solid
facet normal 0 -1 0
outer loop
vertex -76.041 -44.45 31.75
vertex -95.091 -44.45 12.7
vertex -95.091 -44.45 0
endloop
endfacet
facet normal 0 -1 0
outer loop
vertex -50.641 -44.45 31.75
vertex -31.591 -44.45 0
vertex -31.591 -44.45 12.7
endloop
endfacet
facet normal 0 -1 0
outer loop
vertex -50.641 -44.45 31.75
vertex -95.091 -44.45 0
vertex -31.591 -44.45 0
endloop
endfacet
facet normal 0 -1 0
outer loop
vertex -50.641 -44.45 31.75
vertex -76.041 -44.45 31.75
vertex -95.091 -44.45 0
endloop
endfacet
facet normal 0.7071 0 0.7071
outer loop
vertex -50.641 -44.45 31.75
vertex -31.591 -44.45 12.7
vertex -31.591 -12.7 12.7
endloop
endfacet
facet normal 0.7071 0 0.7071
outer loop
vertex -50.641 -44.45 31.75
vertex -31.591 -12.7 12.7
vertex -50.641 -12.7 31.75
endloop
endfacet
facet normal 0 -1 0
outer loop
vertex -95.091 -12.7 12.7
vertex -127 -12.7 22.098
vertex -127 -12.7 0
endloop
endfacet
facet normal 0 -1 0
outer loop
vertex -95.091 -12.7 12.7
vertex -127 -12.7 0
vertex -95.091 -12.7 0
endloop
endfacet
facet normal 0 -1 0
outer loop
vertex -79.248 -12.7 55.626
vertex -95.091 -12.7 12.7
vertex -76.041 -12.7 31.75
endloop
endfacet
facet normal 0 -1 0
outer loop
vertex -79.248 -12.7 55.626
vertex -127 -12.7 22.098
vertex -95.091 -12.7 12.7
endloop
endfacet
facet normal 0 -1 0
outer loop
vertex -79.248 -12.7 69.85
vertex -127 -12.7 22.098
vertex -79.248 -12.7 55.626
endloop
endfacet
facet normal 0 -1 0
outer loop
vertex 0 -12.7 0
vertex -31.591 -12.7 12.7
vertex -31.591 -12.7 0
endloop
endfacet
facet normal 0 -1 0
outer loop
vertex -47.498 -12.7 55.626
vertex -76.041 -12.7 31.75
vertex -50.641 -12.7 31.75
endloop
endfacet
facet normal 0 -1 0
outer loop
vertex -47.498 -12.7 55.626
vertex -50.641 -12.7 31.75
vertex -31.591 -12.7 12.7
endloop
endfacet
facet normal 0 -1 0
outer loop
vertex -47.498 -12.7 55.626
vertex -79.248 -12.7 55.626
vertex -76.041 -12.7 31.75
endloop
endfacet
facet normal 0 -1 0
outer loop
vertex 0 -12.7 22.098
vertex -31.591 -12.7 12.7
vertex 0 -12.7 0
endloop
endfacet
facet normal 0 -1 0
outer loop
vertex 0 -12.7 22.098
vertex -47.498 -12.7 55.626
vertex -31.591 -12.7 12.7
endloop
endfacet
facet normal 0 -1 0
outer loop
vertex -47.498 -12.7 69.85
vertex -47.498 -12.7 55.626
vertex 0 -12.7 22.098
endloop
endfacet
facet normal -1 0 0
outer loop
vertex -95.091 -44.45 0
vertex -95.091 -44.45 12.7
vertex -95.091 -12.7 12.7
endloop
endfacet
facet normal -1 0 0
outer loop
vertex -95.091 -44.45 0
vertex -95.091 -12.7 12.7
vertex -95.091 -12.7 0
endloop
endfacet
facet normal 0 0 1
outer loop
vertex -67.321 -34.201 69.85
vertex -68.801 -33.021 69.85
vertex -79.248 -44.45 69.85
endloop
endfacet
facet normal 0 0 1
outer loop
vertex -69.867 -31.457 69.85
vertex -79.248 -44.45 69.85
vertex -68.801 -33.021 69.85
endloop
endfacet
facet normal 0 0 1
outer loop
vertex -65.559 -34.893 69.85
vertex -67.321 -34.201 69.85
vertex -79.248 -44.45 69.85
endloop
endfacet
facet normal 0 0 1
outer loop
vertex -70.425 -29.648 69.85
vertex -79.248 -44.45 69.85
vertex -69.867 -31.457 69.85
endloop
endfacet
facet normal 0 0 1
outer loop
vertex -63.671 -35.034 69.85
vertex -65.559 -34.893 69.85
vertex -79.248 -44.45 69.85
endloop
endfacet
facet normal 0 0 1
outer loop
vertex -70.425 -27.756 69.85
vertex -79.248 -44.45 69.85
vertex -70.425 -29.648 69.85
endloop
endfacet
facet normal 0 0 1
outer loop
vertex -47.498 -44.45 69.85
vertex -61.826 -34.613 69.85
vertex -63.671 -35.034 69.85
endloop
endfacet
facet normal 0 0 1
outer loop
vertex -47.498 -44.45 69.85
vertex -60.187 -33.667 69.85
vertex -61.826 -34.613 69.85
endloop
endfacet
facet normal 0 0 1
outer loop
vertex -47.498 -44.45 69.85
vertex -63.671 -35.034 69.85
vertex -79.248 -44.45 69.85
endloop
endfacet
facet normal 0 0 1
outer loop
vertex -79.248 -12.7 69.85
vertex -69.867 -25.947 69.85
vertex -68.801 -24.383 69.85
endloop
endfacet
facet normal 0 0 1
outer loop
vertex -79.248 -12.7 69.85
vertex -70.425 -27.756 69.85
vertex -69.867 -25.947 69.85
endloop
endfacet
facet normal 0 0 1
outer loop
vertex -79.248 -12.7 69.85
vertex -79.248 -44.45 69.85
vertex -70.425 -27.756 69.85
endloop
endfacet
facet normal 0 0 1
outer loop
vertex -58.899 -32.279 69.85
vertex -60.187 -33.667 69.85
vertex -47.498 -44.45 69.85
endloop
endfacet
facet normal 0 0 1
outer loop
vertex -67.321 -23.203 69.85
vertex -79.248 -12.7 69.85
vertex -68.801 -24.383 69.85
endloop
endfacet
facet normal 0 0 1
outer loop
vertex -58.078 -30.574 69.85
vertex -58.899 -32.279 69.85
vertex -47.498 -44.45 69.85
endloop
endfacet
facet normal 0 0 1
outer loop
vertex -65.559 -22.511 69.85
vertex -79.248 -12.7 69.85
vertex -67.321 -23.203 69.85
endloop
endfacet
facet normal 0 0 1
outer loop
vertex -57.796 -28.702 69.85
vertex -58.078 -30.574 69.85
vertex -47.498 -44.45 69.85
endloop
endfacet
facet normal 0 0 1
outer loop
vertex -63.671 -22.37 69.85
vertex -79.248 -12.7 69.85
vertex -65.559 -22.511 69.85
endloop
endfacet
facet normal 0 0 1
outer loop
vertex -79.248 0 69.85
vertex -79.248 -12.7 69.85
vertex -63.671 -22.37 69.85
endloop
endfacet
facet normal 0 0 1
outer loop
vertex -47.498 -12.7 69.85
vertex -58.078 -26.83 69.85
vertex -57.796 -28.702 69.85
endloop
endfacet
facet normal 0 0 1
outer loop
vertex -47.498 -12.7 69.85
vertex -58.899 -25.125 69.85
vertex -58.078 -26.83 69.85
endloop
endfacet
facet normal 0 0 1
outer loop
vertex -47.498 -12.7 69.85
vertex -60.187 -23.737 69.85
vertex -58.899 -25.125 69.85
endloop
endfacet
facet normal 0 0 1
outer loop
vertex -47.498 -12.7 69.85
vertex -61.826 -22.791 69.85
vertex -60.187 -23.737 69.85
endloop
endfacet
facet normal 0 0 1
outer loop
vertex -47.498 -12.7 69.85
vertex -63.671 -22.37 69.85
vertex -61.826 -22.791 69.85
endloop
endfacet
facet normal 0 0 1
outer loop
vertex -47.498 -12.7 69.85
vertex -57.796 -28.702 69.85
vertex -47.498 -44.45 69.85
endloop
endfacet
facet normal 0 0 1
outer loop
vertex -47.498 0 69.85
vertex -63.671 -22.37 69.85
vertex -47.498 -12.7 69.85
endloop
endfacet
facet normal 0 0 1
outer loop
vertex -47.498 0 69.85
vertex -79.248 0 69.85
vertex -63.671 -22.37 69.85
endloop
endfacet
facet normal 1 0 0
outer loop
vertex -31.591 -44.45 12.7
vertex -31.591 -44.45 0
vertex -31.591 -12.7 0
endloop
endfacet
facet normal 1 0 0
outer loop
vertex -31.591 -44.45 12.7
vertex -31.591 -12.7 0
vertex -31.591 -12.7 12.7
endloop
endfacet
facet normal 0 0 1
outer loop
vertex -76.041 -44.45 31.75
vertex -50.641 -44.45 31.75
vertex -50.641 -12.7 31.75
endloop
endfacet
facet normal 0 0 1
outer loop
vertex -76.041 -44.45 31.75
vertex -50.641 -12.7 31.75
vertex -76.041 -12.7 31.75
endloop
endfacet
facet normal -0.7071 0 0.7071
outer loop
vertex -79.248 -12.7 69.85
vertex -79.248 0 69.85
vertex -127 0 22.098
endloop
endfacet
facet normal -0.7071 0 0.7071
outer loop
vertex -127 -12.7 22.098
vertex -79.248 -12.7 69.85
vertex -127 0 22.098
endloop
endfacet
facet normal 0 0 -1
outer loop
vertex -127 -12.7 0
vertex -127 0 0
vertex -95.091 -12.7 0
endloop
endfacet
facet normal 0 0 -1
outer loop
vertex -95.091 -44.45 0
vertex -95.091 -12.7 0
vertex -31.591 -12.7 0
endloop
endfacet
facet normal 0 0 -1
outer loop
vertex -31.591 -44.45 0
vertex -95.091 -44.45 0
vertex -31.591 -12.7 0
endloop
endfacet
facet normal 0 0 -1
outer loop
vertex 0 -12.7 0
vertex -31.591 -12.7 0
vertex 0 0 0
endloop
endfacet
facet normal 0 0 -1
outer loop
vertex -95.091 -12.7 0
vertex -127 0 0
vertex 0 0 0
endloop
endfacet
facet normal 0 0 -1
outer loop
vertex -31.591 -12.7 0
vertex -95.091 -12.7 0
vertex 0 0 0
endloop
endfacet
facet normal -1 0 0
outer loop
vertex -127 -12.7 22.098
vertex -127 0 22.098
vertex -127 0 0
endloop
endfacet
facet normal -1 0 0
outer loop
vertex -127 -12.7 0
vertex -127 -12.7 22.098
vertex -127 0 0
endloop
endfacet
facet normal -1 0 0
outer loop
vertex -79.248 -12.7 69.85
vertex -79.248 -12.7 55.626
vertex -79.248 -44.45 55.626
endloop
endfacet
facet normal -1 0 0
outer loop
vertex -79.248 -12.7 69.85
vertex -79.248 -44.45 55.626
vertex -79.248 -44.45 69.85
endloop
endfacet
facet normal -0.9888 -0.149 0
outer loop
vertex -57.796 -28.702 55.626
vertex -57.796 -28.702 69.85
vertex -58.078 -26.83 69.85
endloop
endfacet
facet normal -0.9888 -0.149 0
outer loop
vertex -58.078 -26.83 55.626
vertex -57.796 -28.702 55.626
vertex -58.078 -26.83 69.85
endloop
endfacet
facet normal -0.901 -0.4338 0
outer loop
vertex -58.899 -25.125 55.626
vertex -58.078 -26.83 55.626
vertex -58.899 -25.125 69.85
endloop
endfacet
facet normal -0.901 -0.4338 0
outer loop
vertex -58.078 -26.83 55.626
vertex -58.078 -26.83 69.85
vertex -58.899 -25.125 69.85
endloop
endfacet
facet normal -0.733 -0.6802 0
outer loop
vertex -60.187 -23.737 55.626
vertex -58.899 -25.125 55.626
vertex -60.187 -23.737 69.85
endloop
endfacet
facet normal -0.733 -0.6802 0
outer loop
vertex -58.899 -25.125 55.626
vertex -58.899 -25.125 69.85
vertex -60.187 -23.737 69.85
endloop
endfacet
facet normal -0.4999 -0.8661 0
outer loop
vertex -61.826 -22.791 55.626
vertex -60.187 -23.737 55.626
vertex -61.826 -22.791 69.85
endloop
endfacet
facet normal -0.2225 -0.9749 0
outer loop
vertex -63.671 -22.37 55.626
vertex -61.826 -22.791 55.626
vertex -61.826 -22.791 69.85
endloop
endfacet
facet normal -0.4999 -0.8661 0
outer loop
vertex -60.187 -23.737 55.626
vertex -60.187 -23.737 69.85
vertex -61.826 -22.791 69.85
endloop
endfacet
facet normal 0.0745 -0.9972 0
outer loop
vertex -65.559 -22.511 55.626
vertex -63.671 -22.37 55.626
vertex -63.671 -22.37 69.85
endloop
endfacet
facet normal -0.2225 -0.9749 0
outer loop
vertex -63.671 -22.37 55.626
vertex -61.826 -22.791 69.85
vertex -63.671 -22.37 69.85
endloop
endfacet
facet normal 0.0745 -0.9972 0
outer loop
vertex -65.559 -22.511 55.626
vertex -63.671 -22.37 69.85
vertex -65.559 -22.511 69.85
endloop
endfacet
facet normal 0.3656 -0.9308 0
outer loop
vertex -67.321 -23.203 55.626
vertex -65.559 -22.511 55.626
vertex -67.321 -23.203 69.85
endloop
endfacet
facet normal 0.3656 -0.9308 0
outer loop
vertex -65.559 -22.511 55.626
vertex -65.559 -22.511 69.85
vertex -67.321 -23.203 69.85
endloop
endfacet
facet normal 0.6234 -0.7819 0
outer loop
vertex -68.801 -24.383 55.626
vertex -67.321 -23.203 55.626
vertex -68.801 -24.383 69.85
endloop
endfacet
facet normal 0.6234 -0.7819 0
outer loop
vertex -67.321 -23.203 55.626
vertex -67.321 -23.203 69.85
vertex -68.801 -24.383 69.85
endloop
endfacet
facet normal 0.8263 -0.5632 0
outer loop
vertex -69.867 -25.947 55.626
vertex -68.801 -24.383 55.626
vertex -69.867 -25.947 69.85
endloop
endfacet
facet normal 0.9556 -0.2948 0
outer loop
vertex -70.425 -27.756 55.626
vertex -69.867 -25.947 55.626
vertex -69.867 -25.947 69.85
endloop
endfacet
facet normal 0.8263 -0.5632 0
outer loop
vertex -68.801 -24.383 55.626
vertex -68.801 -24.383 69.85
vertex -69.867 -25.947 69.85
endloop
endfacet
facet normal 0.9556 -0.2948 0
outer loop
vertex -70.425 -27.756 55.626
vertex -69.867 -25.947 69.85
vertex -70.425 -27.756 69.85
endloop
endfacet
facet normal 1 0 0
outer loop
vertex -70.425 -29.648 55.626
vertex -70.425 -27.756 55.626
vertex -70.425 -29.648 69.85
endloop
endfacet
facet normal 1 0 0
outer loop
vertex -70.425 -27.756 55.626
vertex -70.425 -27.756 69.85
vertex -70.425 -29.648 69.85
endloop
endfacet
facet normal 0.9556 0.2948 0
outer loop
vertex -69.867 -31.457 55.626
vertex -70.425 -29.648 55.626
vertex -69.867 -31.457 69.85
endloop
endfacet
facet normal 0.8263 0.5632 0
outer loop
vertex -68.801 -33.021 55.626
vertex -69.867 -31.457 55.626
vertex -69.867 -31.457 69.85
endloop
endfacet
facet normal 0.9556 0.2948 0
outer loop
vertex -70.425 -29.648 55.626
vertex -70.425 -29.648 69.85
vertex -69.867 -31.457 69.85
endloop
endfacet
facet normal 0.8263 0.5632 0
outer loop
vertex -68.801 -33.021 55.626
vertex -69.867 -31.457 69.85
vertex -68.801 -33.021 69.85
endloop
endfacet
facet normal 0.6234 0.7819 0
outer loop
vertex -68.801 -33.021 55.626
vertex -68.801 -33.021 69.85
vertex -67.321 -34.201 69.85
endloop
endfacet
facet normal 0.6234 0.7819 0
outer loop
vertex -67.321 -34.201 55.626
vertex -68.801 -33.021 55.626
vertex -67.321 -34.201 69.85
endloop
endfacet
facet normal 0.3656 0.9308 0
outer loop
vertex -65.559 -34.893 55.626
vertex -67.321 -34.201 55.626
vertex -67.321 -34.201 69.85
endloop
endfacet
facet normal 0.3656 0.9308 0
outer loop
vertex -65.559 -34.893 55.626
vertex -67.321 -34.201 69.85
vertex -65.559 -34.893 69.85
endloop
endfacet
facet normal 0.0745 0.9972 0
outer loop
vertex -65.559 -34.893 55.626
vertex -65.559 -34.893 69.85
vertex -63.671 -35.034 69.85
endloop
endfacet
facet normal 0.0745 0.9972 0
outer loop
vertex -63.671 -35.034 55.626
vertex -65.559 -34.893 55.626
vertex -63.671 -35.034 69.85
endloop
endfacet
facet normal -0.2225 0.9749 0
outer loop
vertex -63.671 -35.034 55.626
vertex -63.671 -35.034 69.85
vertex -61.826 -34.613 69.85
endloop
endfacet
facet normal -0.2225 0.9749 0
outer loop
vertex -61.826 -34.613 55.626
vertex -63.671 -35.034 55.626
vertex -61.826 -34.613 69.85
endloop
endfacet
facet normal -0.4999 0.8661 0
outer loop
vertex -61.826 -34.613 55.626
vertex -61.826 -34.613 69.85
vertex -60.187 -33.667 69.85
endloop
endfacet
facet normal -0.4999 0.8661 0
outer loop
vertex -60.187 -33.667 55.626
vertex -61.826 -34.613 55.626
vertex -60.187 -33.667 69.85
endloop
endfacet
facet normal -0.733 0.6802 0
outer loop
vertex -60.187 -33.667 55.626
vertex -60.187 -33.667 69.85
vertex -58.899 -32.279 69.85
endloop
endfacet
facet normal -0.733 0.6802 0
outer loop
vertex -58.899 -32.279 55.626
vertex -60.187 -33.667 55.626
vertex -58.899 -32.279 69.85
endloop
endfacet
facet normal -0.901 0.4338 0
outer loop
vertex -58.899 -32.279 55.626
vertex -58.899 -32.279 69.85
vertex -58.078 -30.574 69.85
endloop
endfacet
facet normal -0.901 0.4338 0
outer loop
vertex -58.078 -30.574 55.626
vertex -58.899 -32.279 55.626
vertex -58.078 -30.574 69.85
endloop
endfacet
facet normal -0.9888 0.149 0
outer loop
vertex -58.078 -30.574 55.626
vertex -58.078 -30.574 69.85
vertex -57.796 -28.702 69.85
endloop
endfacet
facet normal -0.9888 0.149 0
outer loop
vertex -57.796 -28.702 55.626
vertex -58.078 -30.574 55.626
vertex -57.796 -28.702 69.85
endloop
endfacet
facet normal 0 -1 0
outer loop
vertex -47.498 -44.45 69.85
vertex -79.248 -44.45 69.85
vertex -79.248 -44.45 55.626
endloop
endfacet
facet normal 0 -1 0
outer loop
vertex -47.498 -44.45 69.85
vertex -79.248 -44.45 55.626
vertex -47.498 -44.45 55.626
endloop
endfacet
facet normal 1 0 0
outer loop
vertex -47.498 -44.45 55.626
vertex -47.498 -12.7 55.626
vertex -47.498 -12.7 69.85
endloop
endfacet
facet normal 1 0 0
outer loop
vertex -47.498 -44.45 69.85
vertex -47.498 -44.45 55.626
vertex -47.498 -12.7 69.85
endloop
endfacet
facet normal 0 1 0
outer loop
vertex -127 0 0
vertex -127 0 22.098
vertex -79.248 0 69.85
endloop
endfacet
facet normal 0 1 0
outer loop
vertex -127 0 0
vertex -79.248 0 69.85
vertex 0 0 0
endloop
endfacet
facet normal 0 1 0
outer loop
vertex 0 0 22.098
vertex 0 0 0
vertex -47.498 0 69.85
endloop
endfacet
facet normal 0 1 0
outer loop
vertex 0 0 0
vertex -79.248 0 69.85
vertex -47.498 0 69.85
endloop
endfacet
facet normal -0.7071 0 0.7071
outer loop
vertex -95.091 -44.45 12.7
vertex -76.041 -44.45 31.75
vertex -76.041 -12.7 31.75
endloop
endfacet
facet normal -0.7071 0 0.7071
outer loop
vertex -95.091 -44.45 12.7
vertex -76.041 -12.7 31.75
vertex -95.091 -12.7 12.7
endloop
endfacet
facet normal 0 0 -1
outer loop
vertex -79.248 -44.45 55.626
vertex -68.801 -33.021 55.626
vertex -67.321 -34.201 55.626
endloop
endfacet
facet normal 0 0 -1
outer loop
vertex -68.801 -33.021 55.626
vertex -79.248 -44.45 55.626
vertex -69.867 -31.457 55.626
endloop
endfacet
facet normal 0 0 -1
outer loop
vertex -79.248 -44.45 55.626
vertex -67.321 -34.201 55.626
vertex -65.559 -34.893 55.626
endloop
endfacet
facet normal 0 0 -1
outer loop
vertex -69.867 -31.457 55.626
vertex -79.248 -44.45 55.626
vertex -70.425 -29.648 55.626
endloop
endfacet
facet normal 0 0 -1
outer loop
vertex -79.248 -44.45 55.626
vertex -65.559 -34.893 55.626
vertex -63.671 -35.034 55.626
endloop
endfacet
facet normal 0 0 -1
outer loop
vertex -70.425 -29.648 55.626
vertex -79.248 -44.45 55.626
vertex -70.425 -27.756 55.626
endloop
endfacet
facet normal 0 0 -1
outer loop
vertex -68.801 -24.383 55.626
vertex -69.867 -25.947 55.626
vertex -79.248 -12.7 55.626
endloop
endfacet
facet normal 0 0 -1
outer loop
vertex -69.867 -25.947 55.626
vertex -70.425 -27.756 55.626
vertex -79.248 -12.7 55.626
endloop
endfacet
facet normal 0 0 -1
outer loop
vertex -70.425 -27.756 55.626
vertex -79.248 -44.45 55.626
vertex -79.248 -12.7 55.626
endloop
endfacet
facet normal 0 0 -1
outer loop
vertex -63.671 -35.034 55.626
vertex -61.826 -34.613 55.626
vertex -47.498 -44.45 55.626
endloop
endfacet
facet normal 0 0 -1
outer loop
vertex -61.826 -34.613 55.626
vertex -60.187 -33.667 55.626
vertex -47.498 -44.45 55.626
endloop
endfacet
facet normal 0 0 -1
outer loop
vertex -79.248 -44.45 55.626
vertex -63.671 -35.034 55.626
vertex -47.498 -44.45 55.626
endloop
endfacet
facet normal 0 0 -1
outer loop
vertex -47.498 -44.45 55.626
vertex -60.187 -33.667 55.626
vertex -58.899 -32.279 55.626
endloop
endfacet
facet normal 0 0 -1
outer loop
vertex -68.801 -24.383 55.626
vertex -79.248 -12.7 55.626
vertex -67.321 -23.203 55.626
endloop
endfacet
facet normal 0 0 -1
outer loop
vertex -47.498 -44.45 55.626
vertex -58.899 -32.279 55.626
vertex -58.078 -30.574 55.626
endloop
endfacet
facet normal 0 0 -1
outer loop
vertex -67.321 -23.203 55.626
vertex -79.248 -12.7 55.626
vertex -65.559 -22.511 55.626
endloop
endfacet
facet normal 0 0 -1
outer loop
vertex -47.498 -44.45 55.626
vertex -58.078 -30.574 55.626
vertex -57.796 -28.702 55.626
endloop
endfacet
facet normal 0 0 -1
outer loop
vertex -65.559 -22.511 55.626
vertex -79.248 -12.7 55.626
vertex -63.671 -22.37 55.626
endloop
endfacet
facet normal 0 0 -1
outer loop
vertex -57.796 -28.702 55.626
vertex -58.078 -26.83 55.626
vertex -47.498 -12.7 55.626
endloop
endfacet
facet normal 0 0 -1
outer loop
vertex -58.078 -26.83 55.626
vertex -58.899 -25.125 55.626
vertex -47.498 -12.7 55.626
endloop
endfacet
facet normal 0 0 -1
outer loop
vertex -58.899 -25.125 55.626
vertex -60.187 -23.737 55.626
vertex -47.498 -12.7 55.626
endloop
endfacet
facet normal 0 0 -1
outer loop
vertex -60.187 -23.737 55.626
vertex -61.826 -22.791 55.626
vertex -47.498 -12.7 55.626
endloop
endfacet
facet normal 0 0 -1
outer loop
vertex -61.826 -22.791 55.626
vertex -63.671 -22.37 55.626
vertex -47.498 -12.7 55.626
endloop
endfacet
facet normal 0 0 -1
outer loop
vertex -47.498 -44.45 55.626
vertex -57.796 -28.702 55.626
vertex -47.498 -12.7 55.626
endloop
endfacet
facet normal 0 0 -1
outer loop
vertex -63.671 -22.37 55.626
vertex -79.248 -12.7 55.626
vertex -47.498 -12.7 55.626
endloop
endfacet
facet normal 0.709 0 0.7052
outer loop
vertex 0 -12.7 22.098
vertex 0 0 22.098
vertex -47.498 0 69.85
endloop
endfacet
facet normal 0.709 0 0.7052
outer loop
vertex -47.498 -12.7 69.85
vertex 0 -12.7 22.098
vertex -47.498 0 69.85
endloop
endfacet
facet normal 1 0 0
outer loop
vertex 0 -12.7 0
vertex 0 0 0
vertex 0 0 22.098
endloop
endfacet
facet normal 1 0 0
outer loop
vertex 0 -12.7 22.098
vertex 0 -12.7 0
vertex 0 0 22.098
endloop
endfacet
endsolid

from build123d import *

# Parameters (mm, degrees)
F1_DEPTH = 12.7
F3_DEPTH = 31.75
F4_W     = 31.75
F4_H     = 14.224
F5_DEPTH = 31.75
F6_R     = 6.35
F7_DEPTH = 25.4


with BuildPart() as f1:
    # F0 (on Front) → F1 (new body)
    with BuildSketch(Plane.XZ):
        Polygon((-127, 0), (0, 0), (0, 22.098), (-47.498, 69.85), (-79.248, 69.85), (-127, 22.098), align=None)
    extrude(amount=F1_DEPTH)

    # F2 (on face) → F3 (join)
    with BuildSketch(Plane.XZ.offset(12.7)):
        Polygon((-31.5910821557, 0), (-31.5910821557, 12.7), (-50.6410821557, 31.75), (-76.0410821557, 31.75), (-95.0910821557, 12.7), (-95.0910821557, 0), align=None)
    extrude(amount=F3_DEPTH)

    # F4 (on face) → F5 (join)
    with BuildSketch(Plane.XZ.offset(12.7)):
        with Locations((-63.373, 62.738)):
            Rectangle(F4_W, F4_H)
    extrude(amount=F5_DEPTH)

    # F6 (on face) → F7 (cut)
    with BuildSketch(Plane.XY.offset(69.85)):
        with Locations((-64.1456767917, -28.702)):
            Circle(F6_R)
    extrude(amount=-F7_DEPTH, mode=Mode.SUBTRACT)


solid = f1.part
